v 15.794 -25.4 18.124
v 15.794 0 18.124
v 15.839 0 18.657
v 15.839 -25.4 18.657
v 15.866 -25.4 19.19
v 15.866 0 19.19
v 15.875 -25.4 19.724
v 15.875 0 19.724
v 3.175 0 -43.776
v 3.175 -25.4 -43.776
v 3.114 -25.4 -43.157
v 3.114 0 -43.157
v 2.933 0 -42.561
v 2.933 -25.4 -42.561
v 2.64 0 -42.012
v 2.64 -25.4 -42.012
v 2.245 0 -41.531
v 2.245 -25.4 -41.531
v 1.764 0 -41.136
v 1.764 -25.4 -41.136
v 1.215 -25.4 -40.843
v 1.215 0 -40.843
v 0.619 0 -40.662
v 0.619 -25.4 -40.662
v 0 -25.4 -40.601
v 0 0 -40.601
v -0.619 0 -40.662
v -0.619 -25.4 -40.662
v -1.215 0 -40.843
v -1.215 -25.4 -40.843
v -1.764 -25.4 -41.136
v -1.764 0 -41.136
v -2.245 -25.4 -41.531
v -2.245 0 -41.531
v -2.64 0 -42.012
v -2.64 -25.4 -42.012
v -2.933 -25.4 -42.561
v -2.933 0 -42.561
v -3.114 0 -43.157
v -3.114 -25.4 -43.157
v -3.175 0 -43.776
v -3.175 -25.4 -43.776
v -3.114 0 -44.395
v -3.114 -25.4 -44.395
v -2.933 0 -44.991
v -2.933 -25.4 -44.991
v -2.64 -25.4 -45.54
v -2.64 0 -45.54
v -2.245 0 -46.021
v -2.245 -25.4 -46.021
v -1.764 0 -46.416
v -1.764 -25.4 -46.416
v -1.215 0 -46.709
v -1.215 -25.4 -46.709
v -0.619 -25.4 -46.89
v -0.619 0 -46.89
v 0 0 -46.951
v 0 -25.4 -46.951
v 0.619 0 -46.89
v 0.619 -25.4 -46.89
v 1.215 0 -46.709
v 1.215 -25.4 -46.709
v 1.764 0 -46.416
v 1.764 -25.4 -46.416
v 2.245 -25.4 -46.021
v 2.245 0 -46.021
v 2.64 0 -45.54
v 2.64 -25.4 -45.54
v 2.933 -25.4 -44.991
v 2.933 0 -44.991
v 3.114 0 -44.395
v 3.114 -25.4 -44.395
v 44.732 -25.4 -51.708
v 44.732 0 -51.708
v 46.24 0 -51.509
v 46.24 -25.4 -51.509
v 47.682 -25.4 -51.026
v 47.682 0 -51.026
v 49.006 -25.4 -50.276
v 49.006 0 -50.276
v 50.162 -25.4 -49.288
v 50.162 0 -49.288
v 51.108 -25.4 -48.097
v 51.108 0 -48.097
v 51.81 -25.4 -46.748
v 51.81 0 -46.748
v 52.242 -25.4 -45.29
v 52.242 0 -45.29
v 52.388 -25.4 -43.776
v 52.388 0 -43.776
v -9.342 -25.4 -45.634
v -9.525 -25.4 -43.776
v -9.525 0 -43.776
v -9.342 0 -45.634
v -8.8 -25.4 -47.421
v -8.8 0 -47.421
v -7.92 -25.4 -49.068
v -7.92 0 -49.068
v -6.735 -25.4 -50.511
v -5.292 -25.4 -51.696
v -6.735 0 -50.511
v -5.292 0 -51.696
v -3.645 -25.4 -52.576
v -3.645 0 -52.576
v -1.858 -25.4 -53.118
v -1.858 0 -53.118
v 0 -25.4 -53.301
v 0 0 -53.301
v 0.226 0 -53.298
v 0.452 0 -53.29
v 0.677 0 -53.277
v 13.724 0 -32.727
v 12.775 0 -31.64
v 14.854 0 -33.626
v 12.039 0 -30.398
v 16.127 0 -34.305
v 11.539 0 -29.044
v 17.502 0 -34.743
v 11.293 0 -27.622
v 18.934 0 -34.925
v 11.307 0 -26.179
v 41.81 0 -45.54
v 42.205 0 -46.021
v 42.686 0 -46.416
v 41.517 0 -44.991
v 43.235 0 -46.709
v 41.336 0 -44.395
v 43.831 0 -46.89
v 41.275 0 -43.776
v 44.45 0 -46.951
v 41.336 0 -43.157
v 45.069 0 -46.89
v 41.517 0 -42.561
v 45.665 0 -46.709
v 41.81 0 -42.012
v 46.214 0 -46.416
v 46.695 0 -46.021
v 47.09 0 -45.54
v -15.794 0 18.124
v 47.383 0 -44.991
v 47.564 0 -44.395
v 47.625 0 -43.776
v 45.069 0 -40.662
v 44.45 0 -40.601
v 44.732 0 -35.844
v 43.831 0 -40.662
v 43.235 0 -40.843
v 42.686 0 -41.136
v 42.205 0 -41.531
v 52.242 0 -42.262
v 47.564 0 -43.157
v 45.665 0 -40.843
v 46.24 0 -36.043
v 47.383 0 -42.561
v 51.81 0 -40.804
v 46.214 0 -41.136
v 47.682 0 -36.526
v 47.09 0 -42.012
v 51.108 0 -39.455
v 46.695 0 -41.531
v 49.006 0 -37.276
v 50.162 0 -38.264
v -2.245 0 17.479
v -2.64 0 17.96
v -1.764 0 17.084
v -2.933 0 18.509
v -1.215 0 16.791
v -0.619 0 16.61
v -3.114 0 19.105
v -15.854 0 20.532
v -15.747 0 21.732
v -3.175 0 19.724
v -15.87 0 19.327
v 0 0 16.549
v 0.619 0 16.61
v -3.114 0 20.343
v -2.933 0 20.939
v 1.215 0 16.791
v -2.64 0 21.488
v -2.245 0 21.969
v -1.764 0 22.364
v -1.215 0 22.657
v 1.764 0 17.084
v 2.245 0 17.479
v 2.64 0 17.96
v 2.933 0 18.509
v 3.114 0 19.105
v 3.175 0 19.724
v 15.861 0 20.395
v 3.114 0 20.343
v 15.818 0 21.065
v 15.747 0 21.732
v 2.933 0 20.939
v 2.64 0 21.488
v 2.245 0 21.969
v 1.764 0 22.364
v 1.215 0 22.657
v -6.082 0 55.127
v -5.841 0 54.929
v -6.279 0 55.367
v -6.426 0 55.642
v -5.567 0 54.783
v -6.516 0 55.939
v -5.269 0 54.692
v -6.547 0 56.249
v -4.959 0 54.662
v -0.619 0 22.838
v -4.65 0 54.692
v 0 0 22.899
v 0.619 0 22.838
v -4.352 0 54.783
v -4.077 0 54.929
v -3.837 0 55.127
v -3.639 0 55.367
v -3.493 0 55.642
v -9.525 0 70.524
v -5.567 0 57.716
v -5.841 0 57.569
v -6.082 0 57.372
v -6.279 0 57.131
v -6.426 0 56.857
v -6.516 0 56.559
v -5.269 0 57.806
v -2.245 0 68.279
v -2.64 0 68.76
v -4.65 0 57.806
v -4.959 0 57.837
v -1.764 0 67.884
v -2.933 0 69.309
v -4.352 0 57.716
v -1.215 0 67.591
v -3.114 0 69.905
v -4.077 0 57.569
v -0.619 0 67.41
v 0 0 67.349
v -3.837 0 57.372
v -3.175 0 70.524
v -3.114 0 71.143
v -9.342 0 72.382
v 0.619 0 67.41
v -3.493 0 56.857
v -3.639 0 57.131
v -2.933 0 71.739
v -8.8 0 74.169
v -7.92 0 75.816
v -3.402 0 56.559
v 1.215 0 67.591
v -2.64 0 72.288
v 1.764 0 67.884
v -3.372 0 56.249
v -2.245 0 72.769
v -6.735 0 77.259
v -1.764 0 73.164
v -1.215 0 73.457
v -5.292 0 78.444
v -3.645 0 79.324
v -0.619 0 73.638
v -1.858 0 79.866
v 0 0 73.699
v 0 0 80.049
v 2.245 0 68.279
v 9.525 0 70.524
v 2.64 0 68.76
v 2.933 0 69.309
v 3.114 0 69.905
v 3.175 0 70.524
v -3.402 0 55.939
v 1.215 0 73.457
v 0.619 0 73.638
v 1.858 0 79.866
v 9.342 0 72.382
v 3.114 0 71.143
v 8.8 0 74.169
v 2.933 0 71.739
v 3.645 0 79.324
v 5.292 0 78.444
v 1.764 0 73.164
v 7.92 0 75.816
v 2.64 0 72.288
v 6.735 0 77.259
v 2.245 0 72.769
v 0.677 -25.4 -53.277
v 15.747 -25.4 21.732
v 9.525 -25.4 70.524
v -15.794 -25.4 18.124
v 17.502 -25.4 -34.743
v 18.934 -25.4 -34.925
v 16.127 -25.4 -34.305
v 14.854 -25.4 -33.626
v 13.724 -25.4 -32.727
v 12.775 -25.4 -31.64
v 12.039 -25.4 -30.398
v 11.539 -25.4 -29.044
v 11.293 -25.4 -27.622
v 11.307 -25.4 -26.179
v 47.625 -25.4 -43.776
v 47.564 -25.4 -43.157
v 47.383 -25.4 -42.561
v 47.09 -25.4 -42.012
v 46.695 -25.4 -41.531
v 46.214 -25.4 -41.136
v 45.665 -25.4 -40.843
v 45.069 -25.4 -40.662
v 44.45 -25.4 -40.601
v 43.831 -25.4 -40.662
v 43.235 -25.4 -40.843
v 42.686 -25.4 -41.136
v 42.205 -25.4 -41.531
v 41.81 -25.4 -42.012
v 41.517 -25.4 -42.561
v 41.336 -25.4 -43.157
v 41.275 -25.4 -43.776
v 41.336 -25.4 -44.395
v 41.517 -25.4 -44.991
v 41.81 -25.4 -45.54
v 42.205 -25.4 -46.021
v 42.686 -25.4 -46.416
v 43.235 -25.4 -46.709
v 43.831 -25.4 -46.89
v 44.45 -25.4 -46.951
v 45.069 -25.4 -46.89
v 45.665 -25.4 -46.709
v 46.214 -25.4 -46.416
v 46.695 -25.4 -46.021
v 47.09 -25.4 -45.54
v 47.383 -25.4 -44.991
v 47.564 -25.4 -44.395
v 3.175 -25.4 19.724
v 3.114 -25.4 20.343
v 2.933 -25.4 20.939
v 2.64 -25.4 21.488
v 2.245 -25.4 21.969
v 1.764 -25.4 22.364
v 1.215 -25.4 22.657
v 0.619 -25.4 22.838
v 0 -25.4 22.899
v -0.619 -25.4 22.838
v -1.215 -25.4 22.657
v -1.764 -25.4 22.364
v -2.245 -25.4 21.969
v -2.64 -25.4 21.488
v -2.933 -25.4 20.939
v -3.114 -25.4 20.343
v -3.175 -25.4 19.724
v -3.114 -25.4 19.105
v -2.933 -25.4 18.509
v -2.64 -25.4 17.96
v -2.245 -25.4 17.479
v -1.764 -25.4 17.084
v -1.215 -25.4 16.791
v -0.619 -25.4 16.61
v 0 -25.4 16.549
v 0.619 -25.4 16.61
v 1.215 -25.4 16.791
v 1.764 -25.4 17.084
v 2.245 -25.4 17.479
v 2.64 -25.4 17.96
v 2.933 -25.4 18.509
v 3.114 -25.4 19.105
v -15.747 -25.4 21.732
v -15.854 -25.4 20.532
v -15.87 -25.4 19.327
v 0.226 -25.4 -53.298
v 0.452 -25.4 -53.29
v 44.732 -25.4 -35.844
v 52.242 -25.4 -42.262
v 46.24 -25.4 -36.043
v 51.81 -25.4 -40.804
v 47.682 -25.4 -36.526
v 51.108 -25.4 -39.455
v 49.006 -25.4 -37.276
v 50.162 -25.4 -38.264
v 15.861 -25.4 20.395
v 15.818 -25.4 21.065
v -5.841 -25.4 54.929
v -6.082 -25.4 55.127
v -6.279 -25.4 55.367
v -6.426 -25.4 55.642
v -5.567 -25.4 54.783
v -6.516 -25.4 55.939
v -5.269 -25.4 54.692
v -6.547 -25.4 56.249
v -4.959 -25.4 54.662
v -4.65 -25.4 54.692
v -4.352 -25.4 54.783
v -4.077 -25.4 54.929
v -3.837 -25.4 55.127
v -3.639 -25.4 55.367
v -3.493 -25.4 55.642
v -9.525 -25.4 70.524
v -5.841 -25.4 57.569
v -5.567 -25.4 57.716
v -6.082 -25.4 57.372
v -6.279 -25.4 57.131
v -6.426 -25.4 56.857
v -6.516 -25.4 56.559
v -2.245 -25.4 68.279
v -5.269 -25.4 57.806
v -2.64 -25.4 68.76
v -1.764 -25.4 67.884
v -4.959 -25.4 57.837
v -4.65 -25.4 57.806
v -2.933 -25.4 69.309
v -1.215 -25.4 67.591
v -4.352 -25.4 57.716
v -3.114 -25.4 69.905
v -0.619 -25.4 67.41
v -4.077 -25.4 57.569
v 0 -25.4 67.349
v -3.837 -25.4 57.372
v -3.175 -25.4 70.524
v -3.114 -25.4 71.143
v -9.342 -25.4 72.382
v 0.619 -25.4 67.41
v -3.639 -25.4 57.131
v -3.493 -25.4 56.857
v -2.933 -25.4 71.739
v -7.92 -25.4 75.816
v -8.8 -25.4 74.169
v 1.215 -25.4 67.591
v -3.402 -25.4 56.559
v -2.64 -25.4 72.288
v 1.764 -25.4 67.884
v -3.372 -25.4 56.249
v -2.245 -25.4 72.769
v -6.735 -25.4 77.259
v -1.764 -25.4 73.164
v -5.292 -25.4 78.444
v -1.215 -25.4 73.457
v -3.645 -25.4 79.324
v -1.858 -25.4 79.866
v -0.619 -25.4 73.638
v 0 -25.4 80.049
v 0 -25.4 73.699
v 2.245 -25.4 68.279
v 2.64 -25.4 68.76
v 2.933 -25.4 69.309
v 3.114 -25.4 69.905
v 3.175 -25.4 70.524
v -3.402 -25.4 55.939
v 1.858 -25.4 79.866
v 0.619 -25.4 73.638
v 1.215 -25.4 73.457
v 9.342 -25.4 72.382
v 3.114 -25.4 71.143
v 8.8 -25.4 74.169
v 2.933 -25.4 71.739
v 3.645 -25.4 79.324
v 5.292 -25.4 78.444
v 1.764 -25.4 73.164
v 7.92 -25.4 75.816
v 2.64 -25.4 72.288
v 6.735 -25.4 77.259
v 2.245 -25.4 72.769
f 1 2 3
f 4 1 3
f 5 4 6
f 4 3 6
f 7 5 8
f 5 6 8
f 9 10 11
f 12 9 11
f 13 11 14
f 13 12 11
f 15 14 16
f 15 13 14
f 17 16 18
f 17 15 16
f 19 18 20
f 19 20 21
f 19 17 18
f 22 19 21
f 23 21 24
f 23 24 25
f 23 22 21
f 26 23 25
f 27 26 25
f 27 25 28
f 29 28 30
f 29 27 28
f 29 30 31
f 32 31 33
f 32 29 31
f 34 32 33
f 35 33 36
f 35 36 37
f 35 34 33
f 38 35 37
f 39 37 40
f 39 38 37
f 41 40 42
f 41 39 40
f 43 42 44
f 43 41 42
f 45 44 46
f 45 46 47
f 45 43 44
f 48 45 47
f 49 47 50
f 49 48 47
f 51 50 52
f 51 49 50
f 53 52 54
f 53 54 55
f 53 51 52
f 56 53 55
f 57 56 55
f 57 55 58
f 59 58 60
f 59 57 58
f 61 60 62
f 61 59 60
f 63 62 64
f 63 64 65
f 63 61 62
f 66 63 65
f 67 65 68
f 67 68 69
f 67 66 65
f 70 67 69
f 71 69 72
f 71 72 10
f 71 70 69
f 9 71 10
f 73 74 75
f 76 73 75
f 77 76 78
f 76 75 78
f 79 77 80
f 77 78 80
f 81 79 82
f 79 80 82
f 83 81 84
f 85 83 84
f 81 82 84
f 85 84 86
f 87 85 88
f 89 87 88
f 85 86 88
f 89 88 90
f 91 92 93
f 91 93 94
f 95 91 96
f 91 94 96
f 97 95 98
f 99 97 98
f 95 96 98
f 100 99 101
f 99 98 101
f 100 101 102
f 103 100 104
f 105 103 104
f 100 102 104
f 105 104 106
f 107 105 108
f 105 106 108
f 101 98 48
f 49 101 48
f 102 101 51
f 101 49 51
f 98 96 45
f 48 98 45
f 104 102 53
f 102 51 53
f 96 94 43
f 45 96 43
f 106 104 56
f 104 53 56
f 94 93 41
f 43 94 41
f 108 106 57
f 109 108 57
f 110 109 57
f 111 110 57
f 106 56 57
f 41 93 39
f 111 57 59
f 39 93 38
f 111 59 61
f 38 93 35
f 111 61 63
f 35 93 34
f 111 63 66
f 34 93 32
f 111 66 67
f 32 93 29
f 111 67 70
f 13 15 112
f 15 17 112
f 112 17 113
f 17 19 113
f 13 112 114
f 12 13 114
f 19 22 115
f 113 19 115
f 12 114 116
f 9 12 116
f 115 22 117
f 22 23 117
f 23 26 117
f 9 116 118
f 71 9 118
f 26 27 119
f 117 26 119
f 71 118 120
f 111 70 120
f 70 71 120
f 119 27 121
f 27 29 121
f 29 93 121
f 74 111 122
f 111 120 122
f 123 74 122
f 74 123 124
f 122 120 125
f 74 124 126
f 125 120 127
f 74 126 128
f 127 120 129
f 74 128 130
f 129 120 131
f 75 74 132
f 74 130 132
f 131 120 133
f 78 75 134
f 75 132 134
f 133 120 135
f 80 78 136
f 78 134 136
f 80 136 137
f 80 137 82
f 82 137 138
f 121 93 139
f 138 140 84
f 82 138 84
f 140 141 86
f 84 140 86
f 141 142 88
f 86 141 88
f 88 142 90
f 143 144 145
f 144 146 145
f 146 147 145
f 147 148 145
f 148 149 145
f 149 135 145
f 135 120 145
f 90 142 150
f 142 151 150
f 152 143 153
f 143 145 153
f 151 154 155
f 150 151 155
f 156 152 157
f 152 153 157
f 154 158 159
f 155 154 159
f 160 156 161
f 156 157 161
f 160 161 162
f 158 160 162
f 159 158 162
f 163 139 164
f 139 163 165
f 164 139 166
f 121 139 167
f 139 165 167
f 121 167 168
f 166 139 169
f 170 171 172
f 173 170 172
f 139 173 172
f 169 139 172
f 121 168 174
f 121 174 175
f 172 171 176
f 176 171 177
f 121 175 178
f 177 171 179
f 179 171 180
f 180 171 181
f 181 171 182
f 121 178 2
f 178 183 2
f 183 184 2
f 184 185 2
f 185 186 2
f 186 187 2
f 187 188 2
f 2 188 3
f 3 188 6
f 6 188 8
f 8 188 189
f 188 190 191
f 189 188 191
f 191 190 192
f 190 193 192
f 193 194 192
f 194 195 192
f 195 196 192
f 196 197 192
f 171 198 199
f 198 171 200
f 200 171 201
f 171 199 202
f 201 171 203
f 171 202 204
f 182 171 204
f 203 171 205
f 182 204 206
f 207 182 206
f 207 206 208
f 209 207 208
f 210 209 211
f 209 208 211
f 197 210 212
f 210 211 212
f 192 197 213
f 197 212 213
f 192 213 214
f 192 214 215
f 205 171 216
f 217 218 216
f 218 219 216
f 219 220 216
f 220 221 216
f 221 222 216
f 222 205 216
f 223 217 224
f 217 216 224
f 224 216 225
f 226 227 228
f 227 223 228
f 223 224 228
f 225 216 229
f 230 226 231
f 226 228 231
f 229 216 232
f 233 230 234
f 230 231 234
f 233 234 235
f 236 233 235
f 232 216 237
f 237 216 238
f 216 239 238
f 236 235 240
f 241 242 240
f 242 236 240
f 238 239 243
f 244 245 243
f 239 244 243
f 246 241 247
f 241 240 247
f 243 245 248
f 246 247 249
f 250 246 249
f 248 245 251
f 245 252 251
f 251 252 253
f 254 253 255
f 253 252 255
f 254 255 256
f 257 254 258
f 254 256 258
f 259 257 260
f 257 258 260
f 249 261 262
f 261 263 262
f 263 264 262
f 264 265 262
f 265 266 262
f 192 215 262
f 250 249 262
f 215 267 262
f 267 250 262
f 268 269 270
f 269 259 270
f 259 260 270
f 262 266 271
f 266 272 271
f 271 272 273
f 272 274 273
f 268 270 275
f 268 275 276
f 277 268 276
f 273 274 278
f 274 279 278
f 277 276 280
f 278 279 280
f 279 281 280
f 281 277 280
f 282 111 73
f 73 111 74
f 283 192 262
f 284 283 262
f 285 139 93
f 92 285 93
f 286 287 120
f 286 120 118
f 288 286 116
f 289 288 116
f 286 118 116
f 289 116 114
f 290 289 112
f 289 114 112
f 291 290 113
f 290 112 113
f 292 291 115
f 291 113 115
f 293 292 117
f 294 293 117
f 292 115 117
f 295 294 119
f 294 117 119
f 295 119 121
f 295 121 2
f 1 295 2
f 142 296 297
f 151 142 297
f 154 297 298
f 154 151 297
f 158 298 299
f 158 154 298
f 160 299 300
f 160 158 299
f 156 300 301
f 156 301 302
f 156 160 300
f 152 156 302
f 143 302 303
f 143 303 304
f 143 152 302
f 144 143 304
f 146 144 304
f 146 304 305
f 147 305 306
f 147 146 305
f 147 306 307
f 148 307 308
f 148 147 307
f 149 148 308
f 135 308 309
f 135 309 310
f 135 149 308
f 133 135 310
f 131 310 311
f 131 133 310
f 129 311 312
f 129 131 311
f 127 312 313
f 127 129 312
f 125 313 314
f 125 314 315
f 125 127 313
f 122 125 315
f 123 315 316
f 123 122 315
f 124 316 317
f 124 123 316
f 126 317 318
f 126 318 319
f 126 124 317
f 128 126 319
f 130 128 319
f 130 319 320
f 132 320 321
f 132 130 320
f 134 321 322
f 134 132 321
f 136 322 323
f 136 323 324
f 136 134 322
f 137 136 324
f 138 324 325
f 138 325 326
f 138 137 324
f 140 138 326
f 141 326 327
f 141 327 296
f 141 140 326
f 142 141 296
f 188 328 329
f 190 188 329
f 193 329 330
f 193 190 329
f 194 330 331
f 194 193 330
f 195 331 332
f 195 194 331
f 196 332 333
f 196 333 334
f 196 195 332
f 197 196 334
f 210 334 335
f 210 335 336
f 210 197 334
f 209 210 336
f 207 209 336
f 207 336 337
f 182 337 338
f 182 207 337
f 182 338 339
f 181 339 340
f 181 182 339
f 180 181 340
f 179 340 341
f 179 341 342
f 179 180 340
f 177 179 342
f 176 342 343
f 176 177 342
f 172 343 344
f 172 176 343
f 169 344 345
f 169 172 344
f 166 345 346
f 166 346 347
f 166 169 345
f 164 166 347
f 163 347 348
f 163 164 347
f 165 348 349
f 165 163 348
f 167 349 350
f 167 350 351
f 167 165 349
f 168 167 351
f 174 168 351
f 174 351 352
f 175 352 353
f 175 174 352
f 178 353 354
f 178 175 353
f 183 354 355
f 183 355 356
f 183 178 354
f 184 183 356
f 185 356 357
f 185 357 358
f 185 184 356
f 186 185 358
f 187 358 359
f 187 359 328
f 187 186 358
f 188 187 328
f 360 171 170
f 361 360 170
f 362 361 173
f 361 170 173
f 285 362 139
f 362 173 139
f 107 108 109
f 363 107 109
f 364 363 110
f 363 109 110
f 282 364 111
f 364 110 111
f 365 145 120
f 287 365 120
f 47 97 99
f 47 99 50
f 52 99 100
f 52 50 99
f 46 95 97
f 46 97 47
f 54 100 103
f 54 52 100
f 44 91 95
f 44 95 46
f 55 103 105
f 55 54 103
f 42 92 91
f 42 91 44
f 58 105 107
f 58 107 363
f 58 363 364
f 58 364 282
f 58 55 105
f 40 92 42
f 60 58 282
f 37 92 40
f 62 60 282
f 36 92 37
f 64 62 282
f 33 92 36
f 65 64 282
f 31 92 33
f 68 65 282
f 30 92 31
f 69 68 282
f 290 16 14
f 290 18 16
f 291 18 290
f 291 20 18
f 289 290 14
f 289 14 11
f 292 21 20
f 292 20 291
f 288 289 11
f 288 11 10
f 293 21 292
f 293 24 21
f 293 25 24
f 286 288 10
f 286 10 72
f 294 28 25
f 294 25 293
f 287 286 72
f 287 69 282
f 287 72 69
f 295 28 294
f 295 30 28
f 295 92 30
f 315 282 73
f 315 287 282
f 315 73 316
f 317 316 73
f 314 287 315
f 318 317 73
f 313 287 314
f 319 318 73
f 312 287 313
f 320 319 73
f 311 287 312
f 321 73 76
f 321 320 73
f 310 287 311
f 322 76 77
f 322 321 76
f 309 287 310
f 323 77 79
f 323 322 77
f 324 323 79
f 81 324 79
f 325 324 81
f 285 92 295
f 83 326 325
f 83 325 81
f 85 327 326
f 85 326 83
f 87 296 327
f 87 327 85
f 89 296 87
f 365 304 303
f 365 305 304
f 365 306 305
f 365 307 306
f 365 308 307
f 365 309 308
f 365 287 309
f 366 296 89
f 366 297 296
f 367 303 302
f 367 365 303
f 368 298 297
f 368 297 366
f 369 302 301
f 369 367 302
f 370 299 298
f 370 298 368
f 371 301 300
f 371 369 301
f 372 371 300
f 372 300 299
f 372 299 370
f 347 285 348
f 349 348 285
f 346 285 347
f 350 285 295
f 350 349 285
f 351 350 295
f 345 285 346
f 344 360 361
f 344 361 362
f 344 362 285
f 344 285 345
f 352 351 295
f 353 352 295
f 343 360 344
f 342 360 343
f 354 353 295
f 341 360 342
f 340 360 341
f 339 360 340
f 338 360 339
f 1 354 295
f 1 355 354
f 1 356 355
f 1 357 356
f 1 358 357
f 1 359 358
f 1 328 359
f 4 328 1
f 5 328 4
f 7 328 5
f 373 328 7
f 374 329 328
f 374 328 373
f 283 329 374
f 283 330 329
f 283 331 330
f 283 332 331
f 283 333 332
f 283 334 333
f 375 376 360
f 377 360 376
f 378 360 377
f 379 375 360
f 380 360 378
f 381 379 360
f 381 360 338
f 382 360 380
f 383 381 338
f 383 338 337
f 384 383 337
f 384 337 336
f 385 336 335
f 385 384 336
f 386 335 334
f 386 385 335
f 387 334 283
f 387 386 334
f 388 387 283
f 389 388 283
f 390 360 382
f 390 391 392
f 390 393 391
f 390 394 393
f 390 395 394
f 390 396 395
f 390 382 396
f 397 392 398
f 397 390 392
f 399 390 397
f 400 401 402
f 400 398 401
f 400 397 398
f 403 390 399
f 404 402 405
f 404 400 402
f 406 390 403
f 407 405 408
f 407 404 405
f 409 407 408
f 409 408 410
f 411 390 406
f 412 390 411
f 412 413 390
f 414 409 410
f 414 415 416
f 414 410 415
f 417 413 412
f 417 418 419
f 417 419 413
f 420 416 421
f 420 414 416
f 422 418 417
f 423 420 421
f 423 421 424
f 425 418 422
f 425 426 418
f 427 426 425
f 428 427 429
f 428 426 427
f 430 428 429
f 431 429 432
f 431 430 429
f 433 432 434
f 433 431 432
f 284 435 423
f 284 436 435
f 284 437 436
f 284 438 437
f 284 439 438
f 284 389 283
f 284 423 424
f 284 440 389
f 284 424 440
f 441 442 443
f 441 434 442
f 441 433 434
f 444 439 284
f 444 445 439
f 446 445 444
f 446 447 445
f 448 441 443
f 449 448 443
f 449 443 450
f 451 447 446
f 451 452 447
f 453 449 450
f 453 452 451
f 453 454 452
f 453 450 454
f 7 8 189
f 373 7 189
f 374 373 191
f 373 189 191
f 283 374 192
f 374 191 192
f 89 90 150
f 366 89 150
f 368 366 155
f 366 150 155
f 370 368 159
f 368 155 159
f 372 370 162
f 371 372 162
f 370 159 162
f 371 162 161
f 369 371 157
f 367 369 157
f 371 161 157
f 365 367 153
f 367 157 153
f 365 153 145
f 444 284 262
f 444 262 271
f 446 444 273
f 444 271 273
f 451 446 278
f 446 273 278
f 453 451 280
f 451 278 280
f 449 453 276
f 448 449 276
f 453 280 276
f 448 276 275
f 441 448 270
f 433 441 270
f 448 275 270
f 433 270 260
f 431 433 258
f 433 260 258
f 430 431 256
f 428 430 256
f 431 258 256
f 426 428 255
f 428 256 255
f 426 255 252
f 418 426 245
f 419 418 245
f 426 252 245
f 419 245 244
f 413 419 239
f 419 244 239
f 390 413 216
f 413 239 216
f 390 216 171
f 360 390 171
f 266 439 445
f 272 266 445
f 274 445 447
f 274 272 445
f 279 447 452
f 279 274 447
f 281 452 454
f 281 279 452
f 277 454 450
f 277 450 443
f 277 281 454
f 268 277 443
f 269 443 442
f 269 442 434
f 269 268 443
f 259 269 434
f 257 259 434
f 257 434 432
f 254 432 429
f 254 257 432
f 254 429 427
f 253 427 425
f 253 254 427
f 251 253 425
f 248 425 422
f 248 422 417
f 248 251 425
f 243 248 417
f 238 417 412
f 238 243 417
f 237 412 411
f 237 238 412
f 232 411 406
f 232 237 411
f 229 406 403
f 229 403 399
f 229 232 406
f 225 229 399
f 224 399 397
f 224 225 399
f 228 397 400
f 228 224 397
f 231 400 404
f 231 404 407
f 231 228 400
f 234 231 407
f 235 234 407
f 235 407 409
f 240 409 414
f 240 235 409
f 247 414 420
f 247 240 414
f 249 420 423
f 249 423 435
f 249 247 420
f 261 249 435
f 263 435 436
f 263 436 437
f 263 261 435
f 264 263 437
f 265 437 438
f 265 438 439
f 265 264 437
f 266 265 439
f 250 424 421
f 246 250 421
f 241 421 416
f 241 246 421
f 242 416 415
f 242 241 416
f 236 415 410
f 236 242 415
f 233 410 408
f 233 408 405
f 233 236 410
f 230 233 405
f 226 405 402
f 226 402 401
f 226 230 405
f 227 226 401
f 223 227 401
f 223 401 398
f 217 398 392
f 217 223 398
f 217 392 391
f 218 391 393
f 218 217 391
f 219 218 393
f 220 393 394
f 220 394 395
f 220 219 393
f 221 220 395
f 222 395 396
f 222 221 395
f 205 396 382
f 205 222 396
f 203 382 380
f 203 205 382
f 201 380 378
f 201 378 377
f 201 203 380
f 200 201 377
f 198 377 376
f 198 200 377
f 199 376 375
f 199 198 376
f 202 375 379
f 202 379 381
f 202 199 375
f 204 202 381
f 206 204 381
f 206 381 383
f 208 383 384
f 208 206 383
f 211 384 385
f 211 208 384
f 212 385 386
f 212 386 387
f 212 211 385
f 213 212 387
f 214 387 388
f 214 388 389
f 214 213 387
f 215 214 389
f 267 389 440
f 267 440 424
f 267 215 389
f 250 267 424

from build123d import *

# Parameters (mm, degrees)
F0_R     = 3.175
F0_R_2   = 1.5875
F1_DEPTH = 25.4


with BuildPart() as f1:
    # F0 (on Front) → F1 (new body)
    with BuildSketch(Plane.XZ):
        with BuildLine():
            ThreePointArc((-9.525, 70.523976), (0, 60.998976), (9.525, 70.523976))
            ThreePointArc((9.525, 70.523976), (0, 80.048976), (-9.525, 70.523976))
        make_face()
        with Locations((0, 70.523976)):
            Circle(F0_R, mode=Mode.SUBTRACT)
        with BuildLine():
            Line((15.747457, 21.732266), (9.525, 70.523976))
            ThreePointArc((9.525, 70.523976), (0, 60.998976), (-9.525, 70.523976))
            Line((-9.525, 70.523976), (-15.747457, 21.732266))
            ThreePointArc((-15.747457, 21.732266), (0, 35.598976), (15.747457, 21.732266))
        make_face()
        with Locations((-4.959356, 56.249176)):
            Circle(F0_R_2, mode=Mode.SUBTRACT)
        with BuildLine():
            ThreePointArc((15.875, 19.723976), (15.843082, 20.730144), (15.747457, 21.732266))
            ThreePointArc((15.747457, 21.732266), (0, 35.598976), (-15.747457, 21.732266))
            ThreePointArc((-15.747457, 21.732266), (-15.873668, 19.929643), (-15.794203, 18.124357))
            ThreePointArc((-15.794203, 18.124357), (0, 3.848976), (15.794203, 18.124357))
            ThreePointArc((15.794203, 18.124357), (15.854788, 18.923147), (15.875, 19.723976))
        make_face()
        with Locations((0, 19.723976)):
            Circle(F0_R, mode=Mode.SUBTRACT)
        with BuildLine():
            ThreePointArc((15.794203, 18.124357), (0, 3.848976), (-15.794203, 18.124357))
            Line((-15.794203, 18.124357), (-9.525, -43.776024))
            ThreePointArc((-9.525, -43.776024), (0, -34.251024), (9.525, -43.776024))
            ThreePointArc((9.525, -43.776024), (6.970557, -50.267323), (0.677344, -53.27691))
            Line((0.677344, -53.27691), (44.732405, -51.708498))
            ThreePointArc((44.732405, -51.708498), (36.5125, -43.776024), (44.732405, -35.843549))
            Line((44.732405, -35.843549), (18.934103, -34.9251))
            ThreePointArc((18.934103, -34.9251), (13.224974, -32.205044), (11.307223, -26.178844))
            Line((11.307223, -26.178844), (15.794203, 18.124357))
        make_face()
        with BuildLine():
            ThreePointArc((9.525, -43.776024), (0, -34.251024), (-9.525, -43.776024))
            ThreePointArc((-9.525, -43.776024), (-6.735192, -50.511216), (0, -53.301024))
            Line((0, -53.301024), (0.677344, -53.27691))
            ThreePointArc((0.677344, -53.27691), (6.970557, -50.267323), (9.525, -43.776024))
        make_face()
        with Locations((0, -43.776024)):
            Circle(F0_R, mode=Mode.SUBTRACT)
        with BuildLine():
            Line((0.677344, -53.27691), (0, -53.301024))
            ThreePointArc((0, -53.301024), (0.338886, -53.294993), (0.677344, -53.27691))
        make_face()
        with BuildLine():
            ThreePointArc((52.3875, -43.776024), (50.161633, -38.264113), (44.732405, -35.843549))
            ThreePointArc((44.732405, -35.843549), (36.5125, -43.776024), (44.732405, -51.708498))
            ThreePointArc((44.732405, -51.708498), (50.161633, -49.287934), (52.3875, -43.776024))
        make_face()
        with Locations((44.45, -43.776024)):
            Circle(F0_R, mode=Mode.SUBTRACT)
    extrude(amount=F1_DEPTH)


solid = f1.part
